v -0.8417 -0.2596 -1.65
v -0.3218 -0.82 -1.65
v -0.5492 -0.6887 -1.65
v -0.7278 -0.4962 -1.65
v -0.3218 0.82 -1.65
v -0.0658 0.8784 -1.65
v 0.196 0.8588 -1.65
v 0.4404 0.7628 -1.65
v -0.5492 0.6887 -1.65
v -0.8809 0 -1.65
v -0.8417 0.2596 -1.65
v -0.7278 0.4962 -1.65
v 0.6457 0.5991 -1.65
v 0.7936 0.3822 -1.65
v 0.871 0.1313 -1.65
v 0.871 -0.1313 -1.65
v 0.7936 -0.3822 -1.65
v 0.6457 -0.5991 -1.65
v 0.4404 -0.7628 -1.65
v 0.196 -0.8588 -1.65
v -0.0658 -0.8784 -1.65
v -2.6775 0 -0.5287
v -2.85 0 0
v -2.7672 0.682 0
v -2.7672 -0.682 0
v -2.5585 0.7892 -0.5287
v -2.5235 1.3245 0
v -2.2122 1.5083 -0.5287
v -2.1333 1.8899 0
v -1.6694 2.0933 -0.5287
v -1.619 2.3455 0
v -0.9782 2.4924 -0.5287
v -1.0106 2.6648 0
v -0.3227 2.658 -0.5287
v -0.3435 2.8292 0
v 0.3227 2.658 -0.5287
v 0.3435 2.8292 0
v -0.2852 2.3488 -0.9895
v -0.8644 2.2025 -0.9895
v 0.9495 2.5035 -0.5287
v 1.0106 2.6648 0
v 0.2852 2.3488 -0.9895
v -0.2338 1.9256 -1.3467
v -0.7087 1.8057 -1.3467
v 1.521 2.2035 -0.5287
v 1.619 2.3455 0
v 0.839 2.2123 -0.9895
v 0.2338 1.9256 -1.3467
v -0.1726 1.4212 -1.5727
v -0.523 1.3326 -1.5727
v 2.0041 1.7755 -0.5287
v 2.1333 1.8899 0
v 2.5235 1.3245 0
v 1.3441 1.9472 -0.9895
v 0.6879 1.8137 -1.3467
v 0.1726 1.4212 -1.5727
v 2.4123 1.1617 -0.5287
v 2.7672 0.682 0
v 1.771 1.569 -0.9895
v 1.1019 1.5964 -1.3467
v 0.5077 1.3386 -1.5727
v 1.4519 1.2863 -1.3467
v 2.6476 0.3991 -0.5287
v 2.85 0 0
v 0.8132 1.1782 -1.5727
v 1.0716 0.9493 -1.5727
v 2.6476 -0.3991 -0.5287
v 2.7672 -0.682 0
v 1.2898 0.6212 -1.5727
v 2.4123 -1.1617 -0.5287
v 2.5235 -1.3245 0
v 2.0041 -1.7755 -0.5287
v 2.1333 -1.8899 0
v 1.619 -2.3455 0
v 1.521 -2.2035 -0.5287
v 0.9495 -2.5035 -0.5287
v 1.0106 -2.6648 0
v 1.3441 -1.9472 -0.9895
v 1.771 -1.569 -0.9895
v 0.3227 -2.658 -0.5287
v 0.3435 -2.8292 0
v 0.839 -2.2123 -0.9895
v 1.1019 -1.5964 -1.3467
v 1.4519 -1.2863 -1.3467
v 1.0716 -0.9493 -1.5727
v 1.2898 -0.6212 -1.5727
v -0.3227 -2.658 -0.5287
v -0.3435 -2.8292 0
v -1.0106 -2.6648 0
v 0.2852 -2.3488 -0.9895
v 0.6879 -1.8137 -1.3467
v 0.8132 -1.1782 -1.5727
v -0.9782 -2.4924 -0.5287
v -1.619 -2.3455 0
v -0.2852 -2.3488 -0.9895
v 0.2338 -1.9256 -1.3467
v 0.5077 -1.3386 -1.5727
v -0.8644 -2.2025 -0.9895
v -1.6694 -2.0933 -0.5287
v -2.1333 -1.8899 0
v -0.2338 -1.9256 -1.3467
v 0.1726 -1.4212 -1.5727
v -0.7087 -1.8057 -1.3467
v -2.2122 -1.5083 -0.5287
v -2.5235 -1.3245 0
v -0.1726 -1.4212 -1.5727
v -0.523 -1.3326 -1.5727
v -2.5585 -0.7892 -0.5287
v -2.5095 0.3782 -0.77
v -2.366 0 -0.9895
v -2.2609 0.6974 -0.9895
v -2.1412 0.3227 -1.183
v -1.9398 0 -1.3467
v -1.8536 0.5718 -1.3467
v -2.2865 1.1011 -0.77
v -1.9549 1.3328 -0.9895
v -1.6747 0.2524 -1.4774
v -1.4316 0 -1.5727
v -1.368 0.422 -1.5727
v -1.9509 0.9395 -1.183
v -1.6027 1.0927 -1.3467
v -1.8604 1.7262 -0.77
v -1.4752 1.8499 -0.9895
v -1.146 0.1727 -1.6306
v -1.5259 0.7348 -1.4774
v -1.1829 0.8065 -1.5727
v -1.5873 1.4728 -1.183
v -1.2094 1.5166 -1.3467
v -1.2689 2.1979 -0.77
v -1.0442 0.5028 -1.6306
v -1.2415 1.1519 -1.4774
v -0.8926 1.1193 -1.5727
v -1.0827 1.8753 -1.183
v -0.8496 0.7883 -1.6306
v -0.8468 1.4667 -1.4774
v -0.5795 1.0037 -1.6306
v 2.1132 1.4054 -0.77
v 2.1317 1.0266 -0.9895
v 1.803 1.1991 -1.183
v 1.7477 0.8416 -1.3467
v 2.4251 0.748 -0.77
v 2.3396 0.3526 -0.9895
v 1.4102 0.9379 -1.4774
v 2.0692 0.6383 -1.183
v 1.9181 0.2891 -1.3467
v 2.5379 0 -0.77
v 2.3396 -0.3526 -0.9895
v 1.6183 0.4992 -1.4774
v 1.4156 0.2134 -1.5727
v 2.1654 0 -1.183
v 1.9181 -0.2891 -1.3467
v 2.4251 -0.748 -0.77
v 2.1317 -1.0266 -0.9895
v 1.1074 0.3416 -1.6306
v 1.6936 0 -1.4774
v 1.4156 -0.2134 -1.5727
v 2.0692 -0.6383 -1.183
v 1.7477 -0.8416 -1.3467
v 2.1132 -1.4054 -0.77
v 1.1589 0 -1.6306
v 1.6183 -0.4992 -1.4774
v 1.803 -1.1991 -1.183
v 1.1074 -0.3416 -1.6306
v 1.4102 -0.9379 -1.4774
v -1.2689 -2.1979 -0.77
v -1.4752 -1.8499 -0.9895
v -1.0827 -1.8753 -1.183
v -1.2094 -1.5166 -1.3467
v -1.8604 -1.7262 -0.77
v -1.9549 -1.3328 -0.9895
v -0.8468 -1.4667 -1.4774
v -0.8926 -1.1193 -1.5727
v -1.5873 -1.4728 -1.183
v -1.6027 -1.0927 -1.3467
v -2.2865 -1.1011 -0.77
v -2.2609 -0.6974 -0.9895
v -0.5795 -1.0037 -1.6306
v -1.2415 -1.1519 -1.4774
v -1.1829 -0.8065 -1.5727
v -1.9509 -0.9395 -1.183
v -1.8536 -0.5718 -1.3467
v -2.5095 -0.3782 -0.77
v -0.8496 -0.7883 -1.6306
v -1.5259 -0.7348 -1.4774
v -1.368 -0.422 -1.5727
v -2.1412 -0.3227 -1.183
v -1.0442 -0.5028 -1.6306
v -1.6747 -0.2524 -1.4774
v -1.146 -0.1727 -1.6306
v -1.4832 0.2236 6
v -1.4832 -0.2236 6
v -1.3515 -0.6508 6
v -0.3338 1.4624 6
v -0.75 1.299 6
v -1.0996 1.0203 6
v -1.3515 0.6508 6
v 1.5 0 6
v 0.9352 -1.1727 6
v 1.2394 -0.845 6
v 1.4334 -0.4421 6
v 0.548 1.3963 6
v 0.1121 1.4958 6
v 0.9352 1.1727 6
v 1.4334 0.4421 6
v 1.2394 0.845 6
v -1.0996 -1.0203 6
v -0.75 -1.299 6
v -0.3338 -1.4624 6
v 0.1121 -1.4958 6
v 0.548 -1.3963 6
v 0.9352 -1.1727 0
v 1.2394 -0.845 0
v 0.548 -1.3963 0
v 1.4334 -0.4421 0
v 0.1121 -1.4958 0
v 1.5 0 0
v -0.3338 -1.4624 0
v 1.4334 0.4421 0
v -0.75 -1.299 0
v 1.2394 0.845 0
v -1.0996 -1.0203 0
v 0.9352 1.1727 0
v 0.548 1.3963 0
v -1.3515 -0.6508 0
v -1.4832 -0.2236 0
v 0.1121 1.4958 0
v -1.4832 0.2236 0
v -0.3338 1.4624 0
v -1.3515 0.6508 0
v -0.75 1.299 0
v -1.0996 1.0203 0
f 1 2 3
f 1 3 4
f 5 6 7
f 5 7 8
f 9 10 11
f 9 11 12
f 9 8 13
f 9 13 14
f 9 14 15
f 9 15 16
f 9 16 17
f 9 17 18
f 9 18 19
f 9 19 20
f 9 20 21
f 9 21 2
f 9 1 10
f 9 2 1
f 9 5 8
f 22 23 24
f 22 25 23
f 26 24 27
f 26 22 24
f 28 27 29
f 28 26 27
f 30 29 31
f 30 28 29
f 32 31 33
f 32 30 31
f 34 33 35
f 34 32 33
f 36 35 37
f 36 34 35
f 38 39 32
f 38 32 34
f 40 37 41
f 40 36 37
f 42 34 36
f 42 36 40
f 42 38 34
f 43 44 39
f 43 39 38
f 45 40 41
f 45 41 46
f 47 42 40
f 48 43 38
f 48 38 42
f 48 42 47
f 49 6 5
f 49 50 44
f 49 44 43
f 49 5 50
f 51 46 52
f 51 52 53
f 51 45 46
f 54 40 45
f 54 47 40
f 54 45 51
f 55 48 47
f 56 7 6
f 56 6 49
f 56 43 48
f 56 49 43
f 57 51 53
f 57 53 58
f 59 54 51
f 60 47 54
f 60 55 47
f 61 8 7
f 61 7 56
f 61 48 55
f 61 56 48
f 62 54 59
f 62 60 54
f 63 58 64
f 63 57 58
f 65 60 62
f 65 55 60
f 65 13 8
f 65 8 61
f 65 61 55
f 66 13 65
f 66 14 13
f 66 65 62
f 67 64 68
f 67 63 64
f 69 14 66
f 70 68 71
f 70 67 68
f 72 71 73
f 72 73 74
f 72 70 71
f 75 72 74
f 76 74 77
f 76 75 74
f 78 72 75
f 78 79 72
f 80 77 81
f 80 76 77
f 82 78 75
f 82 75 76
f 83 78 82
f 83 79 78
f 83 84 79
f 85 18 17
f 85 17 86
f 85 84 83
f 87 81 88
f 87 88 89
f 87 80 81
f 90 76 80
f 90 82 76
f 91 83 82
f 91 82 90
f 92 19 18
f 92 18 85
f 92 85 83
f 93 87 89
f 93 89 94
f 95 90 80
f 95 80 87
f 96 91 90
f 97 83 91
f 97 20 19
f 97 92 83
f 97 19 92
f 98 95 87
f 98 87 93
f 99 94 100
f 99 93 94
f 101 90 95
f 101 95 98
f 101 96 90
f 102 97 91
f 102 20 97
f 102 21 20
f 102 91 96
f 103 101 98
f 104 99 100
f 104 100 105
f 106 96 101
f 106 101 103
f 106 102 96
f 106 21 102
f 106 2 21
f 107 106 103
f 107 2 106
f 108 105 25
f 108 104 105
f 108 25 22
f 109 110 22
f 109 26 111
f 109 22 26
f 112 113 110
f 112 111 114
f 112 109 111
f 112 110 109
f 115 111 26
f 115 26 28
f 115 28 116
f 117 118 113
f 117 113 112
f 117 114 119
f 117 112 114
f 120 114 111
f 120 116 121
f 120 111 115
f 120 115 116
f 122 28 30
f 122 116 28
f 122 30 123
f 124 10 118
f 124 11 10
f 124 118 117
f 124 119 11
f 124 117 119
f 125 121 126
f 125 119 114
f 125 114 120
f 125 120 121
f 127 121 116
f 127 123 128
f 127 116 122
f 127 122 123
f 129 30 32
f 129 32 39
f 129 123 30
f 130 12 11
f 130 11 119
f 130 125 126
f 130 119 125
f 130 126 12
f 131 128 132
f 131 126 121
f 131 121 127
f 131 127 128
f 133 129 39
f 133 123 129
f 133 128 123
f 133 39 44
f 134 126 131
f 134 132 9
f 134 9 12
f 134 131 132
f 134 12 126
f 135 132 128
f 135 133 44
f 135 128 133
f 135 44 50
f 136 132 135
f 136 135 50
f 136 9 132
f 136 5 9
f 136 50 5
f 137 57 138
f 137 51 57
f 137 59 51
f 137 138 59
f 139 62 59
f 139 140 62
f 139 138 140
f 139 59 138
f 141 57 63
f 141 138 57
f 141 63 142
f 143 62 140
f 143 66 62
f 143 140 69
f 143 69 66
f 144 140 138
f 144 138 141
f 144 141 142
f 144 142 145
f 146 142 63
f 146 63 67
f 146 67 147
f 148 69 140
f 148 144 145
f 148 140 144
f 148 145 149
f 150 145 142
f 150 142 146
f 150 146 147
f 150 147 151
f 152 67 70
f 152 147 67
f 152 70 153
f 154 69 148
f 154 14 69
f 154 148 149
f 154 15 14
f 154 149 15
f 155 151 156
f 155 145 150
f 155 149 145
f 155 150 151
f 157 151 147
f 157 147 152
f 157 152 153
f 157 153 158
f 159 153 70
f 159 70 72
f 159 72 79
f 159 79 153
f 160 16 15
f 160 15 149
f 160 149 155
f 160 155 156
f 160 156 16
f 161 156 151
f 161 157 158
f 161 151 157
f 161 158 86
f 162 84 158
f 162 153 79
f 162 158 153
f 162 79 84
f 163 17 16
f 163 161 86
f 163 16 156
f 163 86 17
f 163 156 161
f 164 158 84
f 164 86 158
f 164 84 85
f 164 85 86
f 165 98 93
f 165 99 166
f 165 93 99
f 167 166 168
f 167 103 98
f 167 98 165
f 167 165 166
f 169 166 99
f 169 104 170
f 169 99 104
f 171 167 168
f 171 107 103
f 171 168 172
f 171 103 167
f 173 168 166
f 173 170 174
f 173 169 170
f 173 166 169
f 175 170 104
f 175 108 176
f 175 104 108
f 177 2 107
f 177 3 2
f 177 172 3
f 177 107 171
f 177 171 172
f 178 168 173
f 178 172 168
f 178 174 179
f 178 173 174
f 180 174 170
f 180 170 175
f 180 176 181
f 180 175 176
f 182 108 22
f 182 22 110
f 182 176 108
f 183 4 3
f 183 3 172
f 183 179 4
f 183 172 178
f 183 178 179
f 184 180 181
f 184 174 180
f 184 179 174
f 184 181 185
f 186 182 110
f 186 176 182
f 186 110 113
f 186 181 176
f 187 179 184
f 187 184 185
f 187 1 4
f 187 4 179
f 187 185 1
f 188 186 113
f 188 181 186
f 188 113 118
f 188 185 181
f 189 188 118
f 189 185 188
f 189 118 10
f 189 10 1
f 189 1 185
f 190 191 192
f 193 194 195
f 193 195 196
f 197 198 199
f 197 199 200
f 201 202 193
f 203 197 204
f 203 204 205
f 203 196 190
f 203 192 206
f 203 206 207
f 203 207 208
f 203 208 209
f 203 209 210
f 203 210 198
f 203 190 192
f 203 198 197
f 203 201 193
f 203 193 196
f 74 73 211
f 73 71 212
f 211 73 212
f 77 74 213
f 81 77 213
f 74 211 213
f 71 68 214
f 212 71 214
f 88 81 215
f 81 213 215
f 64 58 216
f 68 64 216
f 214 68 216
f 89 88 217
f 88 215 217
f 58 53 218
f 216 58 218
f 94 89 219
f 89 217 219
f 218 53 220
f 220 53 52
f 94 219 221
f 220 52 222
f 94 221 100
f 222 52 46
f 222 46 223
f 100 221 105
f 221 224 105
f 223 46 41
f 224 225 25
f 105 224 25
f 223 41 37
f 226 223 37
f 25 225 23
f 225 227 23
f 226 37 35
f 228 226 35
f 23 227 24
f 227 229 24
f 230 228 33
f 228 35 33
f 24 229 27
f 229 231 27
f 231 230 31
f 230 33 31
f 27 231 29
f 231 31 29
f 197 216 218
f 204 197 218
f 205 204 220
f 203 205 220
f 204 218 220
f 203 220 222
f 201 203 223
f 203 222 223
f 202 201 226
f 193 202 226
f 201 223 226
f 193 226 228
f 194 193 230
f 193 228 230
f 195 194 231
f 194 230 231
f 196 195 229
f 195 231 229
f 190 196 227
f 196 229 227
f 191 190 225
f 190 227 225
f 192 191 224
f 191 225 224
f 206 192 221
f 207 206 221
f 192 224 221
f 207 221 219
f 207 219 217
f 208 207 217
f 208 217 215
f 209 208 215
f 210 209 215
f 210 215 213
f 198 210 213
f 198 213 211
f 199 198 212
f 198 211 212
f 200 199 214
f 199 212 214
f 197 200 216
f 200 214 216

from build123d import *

# Parameters (mm, degrees)
SKETCH_1_R      = 1.5
EXTRUDE_1_DEPTH = 6
SKETCH_2_R      = 2.85
EXTRUDE_2_DEPTH = 1.65
FILLET_1_R      = 2


with BuildPart() as part:
    # 草图1 → 凸台-拉伸1 (new body)
    with BuildSketch(Plane.XY):
        Circle(SKETCH_1_R)
    extrude(amount=EXTRUDE_1_DEPTH)

    # 草图2 → 凸台-拉伸2 (add)
    with BuildSketch(Plane(origin=(0, 0, 0), x_dir=(-1, 0, 0), z_dir=(0, 0, -1))):
        Circle(SKETCH_2_R)
    extrude(amount=EXTRUDE_2_DEPTH)

    # 圆角1
    # the kernel refuses this fillet: 2 mm, written as the material it takes off along each edge
    with BuildSketch(Plane(origin=(0, 0, -1.65), x_dir=(-1, 0, 0), z_dir=(0, -1, 0))) as fillet_1_piece_1:
        with BuildLine():
            CenterArc((0.880863133, -2), FILLET_1_R, 10.078658108, 79.921341892)
            Line((0.880863133, 0), (0.880863133, 0.04))
            Line((0.880863133, 0.04), (2.85, 0.04))
            Line((2.85, 0.04), (2.89, 0))
            ThreePointArc((2.89, 0), (2.89, -0.825), (2.889382737, -1.643))
            Line((2.889382737, -1.643), (2.85, -1.65))
        make_face()
    revolve(axis=Axis((0, 0, -1.65), (0, 0, -1)), mode=Mode.SUBTRACT)


solid = part.part
